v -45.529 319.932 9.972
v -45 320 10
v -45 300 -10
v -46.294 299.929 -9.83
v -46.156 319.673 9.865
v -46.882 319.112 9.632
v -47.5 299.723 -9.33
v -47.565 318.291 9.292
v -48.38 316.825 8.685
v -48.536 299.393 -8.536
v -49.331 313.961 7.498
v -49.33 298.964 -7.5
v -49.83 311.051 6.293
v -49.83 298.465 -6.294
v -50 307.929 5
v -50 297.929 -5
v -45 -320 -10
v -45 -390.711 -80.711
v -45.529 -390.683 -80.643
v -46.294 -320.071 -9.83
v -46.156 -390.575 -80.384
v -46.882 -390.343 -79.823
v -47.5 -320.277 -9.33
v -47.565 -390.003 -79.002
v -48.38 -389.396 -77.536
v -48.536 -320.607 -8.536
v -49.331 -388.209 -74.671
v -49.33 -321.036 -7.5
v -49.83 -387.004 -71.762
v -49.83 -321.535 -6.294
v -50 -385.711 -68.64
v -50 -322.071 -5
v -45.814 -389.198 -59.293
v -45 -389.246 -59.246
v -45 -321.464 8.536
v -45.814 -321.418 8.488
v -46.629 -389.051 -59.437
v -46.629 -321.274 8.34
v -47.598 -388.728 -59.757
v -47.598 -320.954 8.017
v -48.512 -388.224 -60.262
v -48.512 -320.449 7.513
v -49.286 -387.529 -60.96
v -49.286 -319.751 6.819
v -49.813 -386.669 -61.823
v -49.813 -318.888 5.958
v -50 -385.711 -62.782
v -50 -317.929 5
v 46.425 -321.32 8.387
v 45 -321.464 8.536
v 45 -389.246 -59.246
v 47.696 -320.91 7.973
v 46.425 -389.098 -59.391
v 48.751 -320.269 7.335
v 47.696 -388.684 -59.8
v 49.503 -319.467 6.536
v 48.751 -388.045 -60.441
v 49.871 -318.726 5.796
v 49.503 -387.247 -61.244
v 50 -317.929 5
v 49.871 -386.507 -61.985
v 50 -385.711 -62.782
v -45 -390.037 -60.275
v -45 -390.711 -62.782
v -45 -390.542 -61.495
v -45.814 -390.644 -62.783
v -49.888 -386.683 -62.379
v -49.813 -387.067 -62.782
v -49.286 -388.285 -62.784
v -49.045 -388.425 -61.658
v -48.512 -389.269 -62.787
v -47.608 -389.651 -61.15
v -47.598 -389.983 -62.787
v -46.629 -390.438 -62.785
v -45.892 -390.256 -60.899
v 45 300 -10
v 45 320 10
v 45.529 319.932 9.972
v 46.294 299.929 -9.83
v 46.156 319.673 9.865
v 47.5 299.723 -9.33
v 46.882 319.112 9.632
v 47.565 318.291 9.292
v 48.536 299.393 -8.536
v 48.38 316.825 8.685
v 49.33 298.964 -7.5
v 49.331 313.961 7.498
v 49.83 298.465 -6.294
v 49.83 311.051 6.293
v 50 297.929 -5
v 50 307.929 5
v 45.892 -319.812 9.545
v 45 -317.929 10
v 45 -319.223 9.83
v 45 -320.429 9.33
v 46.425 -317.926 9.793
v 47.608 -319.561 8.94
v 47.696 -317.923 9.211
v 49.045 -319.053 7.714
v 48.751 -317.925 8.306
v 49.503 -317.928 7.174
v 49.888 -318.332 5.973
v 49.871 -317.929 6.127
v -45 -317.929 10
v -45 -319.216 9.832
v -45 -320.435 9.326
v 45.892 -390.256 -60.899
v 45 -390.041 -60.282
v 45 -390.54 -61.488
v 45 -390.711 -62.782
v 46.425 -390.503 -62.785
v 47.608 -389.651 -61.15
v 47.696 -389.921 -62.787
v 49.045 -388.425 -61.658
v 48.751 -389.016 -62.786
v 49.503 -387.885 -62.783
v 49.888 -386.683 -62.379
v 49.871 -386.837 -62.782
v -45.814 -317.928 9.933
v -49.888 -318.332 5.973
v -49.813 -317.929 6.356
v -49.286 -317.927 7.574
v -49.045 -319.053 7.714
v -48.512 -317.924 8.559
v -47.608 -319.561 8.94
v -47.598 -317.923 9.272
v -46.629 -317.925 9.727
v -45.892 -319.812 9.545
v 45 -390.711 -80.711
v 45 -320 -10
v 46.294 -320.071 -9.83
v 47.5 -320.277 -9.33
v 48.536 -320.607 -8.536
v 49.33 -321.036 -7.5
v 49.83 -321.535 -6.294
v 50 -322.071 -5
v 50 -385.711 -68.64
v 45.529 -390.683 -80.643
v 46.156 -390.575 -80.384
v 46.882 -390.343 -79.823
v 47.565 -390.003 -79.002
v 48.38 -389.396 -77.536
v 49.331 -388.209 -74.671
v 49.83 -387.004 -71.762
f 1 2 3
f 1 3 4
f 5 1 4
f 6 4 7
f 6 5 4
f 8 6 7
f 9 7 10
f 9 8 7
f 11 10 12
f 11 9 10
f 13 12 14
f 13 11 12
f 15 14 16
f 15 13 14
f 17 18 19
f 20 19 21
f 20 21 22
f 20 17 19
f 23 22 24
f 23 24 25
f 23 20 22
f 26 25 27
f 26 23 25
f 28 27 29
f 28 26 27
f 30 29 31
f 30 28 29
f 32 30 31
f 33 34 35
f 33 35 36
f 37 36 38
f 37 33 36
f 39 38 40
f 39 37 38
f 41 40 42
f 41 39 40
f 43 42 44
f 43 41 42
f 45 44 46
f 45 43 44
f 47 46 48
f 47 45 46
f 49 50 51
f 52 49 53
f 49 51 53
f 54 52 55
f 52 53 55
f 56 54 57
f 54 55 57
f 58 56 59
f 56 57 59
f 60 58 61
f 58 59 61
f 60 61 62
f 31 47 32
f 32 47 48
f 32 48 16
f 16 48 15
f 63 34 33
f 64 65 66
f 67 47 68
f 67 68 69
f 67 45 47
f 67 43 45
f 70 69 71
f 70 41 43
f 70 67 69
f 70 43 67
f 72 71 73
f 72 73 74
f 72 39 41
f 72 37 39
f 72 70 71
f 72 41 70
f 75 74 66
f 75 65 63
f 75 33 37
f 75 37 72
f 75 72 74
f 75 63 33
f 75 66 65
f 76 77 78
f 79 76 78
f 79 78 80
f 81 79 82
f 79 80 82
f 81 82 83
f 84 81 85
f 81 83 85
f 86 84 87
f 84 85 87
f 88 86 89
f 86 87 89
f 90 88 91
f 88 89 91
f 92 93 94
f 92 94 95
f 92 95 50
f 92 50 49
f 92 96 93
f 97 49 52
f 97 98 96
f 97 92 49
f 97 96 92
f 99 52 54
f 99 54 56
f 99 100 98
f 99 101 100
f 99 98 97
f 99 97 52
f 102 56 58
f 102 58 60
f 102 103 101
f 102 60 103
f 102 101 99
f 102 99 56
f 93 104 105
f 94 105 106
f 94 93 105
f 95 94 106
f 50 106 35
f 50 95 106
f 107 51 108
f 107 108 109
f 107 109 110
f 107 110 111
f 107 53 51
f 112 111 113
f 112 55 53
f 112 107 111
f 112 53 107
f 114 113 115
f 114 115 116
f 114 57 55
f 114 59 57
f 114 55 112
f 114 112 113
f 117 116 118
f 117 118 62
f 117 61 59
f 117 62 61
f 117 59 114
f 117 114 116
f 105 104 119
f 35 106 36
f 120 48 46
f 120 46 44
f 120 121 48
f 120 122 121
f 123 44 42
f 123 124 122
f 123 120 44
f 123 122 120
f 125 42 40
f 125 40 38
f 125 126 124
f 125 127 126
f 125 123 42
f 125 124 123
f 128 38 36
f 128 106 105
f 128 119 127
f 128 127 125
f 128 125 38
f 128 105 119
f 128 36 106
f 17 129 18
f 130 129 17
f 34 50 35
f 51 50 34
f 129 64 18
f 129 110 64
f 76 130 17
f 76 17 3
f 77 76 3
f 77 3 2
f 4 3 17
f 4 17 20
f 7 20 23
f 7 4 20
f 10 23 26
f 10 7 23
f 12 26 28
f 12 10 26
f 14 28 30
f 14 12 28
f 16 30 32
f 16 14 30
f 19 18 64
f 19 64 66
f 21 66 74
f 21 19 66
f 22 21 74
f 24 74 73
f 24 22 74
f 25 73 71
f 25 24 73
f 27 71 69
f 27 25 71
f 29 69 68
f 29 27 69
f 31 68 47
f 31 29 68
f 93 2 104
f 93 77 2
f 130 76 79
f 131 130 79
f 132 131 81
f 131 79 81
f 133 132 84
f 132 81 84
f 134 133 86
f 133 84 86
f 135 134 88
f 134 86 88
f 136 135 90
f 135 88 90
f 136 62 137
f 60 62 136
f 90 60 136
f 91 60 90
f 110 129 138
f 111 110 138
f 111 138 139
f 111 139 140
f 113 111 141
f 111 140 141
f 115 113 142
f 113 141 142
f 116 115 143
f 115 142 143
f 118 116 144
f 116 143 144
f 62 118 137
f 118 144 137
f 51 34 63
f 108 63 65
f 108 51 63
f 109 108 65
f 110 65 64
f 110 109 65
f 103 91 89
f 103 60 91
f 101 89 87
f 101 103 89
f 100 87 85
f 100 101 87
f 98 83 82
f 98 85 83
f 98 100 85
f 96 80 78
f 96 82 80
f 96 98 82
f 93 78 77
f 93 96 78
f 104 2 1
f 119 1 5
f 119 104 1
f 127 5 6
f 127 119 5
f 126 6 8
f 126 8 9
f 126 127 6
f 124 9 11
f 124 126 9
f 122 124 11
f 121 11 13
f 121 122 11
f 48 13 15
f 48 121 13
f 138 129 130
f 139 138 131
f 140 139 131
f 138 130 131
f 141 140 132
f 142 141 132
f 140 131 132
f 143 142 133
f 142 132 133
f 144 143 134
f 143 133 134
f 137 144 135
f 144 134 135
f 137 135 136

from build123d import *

# Parameters (mm, degrees)
F1_DEPTH = 50
F2_R     = 5
F3_R     = 5


with BuildPart() as f1:
    # F0 (on Right) → F1 (new body, symmetric)
    with BuildSketch(Plane.YZ):
        Polygon((300, -10), (320, 10), (-320, 10), (-320, -10), align=None)
        Polygon((-320, -10), (-320, 10), (-390.7106781187, -60.7106781187), (-390.7106781187, -80.7106781187), align=None)
    extrude(amount=F1_DEPTH, both=True)

    # F2
    f2_edges = [f1.edges().sort_by_distance(p)[0] for p in [
        (50, 310, 0),
        (50, 0, 10),
        (50, -355.355339, -25.355339),
        (50, -390.710678, -70.710678),
        (50, -355.355339, -45.355339),
        (50, -10, -10),
        (-50, 310, 0),
        (-50, 0, 10),
        (-50, -355.355339, -25.355339),
        (-50, -390.710678, -70.710678),
        (-50, -355.355339, -45.355339),
        (-50, -10, -10),
    ]]
    fillet(f2_edges, radius=F2_R)

    # F3
    f3_edges = [f1.edges().sort_by_distance(p)[0] for p in [
        (0, -320, 10),
        (0, -390.710678, -60.710678),
    ]]
    fillet(f3_edges, radius=F3_R)


solid = f1.part
